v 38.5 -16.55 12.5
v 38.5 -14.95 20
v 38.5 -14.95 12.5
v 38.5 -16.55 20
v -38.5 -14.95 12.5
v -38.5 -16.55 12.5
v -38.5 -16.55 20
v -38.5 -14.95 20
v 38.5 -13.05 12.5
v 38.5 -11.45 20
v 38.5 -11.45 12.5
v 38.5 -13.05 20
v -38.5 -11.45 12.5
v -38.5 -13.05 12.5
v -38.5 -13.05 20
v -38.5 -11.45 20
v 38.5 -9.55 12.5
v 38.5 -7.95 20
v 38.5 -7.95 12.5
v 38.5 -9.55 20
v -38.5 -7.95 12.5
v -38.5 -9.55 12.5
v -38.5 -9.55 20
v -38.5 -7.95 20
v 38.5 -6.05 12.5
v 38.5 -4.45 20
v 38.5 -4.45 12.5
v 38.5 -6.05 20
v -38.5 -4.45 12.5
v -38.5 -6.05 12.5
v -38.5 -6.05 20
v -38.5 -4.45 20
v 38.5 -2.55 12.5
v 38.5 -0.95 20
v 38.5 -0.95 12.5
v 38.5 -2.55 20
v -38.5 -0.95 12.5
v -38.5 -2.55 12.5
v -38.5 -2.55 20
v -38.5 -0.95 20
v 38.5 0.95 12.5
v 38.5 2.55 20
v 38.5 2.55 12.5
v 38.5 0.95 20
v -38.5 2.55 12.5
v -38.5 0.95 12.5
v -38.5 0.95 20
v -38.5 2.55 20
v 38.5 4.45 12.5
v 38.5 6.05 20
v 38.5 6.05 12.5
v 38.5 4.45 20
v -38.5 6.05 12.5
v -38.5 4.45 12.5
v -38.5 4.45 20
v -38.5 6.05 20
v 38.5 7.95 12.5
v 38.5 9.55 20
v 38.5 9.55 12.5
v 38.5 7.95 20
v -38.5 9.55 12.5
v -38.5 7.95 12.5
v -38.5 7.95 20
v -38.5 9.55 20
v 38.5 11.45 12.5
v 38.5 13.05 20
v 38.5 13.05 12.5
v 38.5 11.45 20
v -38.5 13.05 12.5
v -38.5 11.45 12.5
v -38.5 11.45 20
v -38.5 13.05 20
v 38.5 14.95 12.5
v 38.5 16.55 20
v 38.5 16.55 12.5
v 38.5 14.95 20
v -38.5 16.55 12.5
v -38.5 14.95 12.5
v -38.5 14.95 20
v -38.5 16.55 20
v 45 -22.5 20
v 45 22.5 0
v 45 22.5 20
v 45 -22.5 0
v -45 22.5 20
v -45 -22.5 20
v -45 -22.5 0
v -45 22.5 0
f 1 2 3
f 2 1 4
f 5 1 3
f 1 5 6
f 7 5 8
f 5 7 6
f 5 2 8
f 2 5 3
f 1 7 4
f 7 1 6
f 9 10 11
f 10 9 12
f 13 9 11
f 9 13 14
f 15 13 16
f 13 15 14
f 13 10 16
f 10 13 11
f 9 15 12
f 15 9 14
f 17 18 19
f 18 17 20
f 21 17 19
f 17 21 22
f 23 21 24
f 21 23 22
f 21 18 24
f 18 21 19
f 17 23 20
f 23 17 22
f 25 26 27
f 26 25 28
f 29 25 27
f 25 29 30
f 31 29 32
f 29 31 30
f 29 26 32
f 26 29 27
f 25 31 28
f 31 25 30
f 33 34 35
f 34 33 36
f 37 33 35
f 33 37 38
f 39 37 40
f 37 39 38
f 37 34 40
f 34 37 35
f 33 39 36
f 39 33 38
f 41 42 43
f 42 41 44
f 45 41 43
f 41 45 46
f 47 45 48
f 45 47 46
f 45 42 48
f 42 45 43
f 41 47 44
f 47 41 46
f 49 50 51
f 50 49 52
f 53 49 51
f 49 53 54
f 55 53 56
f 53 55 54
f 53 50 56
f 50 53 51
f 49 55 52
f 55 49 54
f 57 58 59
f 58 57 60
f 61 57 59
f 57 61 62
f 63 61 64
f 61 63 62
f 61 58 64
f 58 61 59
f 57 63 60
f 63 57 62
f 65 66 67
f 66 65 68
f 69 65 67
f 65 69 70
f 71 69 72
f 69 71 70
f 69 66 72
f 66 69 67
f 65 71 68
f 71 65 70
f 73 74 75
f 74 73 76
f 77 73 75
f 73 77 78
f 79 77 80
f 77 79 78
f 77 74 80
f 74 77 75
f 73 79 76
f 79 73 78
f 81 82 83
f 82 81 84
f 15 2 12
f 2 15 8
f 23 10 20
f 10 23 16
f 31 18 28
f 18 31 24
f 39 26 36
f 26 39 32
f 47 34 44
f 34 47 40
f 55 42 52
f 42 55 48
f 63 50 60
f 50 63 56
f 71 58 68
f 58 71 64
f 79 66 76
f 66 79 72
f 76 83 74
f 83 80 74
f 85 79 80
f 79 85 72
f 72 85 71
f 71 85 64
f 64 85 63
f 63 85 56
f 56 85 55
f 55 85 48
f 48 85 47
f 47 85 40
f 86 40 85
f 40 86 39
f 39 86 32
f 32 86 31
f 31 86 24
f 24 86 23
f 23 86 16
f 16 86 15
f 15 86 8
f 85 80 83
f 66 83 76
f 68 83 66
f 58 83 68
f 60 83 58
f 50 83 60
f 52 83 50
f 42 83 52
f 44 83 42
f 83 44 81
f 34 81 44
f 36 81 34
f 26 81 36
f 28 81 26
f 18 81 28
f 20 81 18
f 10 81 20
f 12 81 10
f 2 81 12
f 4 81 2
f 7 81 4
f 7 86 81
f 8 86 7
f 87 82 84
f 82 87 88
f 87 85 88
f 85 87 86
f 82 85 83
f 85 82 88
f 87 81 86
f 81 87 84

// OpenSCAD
// Drying rack for 10 microscope slides (75 x 25 x 1 mm) standing on edge
// Category: benchware. Block with parallel slots; prints without supports.
// Print: PLA or PETG, 0.2 mm layers, 20 % infill. Check slot width with a real slide.
// SPDX-License-Identifier: CERN-OHL-P-2.0

/* [Rack] */
block = [90, 45, 20];  // X, Y, Z [mm]
n_slots = 10;
slot_pitch = 3.5;      // centre-to-centre [mm]
slot_w = 1.6;          // 1.0-1.2 mm slides + clearance
slot_len = 77;         // along X, slide is 75 mm long
slot_depth = 7.5;

/* [Hidden] */
eps = 0.01;

difference() {
    translate([-block.x / 2, -block.y / 2, 0]) cube(block);
    for (i = [0 : n_slots - 1])
        translate([-slot_len / 2, (i - (n_slots - 1) / 2) * slot_pitch - slot_w / 2, block.z - slot_depth])
            cube([slot_len, slot_w, slot_depth + eps]);
}
